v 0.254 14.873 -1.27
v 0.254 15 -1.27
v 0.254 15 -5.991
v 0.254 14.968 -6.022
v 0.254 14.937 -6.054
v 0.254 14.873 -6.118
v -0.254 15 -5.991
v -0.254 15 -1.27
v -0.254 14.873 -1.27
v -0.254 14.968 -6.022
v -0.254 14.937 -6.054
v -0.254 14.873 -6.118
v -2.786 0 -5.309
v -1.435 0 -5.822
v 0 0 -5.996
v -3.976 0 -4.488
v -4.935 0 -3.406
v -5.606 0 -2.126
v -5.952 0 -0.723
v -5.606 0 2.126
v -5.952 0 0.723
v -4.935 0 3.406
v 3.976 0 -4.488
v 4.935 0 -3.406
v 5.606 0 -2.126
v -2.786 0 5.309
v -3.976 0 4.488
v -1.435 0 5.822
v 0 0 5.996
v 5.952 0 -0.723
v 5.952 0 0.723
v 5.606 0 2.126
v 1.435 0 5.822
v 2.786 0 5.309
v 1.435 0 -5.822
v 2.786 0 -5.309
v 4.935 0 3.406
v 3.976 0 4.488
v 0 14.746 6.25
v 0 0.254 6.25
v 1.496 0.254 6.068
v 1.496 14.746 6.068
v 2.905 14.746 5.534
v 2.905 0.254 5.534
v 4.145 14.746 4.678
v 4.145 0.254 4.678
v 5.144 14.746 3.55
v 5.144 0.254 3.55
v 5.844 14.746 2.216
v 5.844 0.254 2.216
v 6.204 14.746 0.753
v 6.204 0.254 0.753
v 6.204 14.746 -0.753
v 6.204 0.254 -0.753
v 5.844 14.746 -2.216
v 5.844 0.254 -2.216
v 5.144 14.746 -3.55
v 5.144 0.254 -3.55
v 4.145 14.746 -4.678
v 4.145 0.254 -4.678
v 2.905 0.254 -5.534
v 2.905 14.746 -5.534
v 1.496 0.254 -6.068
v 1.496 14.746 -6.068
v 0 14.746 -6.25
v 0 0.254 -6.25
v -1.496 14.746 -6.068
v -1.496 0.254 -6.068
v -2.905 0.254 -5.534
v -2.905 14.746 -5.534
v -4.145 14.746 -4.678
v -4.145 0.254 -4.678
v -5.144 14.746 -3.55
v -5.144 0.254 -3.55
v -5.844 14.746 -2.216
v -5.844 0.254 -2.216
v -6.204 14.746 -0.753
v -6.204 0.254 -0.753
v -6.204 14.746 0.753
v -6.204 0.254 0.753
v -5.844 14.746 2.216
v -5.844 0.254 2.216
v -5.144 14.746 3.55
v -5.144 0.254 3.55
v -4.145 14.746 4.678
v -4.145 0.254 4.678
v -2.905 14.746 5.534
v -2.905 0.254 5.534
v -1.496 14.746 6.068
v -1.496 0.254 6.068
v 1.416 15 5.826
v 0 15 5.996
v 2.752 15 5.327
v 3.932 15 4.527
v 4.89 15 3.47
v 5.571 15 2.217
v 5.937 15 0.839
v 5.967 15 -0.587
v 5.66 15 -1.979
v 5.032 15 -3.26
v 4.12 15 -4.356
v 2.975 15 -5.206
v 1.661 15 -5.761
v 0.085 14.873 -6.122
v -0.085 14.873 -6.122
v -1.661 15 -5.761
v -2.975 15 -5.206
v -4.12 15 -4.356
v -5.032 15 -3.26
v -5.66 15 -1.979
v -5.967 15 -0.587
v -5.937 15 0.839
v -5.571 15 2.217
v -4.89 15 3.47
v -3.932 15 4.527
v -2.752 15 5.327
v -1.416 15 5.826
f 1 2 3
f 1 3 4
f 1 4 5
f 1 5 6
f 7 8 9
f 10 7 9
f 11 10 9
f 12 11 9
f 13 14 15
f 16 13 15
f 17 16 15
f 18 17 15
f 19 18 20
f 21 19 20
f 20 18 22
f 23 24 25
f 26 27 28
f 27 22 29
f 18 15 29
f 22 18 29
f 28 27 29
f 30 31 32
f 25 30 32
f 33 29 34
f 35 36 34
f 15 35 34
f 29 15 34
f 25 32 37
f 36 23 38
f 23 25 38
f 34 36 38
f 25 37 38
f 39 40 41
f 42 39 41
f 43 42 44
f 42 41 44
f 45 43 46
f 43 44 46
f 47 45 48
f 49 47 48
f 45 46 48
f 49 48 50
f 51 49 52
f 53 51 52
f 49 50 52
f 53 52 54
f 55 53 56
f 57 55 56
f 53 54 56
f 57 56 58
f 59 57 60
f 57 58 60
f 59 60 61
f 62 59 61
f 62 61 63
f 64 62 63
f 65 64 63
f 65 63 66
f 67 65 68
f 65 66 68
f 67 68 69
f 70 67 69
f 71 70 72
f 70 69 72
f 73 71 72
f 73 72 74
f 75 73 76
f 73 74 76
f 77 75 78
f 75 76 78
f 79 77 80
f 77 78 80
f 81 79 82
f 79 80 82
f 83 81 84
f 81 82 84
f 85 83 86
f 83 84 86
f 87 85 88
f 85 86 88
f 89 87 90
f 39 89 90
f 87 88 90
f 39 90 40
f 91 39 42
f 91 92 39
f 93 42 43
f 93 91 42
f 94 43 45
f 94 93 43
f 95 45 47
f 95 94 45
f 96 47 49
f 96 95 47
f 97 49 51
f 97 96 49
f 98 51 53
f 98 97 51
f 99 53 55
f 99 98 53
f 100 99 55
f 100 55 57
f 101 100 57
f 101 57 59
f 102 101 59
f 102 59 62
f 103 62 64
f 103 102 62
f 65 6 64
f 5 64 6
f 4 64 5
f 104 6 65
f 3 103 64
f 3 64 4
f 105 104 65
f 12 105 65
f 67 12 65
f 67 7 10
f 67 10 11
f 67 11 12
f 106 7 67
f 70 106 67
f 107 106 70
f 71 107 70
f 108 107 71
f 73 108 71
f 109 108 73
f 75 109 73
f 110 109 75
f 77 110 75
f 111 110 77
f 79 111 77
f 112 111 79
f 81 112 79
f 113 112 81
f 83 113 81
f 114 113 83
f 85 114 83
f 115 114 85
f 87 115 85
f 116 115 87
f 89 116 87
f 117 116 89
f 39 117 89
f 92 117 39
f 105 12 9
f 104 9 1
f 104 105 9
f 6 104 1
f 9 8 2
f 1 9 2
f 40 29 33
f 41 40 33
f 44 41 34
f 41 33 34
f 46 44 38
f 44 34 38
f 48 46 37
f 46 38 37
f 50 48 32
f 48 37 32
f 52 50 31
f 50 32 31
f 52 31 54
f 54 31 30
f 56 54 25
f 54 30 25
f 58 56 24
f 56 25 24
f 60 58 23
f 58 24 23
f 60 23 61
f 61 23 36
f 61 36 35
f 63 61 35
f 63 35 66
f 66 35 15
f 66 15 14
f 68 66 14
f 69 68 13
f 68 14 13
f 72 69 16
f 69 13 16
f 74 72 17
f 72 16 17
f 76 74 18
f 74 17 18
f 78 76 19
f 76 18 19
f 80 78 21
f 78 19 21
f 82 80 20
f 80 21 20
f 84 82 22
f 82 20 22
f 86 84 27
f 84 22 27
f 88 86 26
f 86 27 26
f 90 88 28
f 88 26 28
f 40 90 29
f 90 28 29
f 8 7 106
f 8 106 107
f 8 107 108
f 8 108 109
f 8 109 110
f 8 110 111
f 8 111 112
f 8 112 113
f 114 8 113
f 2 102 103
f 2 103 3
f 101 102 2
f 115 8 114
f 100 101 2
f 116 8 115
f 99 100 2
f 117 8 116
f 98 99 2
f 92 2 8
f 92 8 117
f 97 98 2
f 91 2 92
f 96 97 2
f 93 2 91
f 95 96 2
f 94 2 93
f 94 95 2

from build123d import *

# Parameters (mm, degrees)
SKETCH1_R           = 6.25
BOSS_EXTRUDE1_DEPTH = 15
CHAMFER1_SIZE       = 0.254
SKETCH2_W           = 0.508
SKETCH2_H           = 4.943764677
CUT_EXTRUDE1_DEPTH  = 0.127


with BuildPart() as part:
    # Sketch1 → Boss-Extrude1 (new body)
    with BuildSketch(Plane(origin=(0, 0, 0), x_dir=(1, 0, 0), z_dir=(0, 1, 0))):
        with Locations(Location((0, 0, 0), (0, 0, 270))):
            Circle(SKETCH1_R)
    extrude(amount=BOSS_EXTRUDE1_DEPTH)

    # Chamfer1
    chamfer1_edges = [part.edges().sort_by_distance(p)[0] for p in [
        (0, 0, -6.25),
        (0, 15, -6.25),
    ]]
    chamfer(chamfer1_edges, length=CHAMFER1_SIZE)

    # Sketch2 → Cut-Extrude1 (cut)
    with BuildSketch(Plane(origin=(0, 15, 0), x_dir=(1, 0, 0), z_dir=(0, 1, 0))):
        with Locations((0, 3.741882338)):
            Rectangle(SKETCH2_W, SKETCH2_H)
    extrude(amount=-CUT_EXTRUDE1_DEPTH, mode=Mode.SUBTRACT)


solid = part.part
